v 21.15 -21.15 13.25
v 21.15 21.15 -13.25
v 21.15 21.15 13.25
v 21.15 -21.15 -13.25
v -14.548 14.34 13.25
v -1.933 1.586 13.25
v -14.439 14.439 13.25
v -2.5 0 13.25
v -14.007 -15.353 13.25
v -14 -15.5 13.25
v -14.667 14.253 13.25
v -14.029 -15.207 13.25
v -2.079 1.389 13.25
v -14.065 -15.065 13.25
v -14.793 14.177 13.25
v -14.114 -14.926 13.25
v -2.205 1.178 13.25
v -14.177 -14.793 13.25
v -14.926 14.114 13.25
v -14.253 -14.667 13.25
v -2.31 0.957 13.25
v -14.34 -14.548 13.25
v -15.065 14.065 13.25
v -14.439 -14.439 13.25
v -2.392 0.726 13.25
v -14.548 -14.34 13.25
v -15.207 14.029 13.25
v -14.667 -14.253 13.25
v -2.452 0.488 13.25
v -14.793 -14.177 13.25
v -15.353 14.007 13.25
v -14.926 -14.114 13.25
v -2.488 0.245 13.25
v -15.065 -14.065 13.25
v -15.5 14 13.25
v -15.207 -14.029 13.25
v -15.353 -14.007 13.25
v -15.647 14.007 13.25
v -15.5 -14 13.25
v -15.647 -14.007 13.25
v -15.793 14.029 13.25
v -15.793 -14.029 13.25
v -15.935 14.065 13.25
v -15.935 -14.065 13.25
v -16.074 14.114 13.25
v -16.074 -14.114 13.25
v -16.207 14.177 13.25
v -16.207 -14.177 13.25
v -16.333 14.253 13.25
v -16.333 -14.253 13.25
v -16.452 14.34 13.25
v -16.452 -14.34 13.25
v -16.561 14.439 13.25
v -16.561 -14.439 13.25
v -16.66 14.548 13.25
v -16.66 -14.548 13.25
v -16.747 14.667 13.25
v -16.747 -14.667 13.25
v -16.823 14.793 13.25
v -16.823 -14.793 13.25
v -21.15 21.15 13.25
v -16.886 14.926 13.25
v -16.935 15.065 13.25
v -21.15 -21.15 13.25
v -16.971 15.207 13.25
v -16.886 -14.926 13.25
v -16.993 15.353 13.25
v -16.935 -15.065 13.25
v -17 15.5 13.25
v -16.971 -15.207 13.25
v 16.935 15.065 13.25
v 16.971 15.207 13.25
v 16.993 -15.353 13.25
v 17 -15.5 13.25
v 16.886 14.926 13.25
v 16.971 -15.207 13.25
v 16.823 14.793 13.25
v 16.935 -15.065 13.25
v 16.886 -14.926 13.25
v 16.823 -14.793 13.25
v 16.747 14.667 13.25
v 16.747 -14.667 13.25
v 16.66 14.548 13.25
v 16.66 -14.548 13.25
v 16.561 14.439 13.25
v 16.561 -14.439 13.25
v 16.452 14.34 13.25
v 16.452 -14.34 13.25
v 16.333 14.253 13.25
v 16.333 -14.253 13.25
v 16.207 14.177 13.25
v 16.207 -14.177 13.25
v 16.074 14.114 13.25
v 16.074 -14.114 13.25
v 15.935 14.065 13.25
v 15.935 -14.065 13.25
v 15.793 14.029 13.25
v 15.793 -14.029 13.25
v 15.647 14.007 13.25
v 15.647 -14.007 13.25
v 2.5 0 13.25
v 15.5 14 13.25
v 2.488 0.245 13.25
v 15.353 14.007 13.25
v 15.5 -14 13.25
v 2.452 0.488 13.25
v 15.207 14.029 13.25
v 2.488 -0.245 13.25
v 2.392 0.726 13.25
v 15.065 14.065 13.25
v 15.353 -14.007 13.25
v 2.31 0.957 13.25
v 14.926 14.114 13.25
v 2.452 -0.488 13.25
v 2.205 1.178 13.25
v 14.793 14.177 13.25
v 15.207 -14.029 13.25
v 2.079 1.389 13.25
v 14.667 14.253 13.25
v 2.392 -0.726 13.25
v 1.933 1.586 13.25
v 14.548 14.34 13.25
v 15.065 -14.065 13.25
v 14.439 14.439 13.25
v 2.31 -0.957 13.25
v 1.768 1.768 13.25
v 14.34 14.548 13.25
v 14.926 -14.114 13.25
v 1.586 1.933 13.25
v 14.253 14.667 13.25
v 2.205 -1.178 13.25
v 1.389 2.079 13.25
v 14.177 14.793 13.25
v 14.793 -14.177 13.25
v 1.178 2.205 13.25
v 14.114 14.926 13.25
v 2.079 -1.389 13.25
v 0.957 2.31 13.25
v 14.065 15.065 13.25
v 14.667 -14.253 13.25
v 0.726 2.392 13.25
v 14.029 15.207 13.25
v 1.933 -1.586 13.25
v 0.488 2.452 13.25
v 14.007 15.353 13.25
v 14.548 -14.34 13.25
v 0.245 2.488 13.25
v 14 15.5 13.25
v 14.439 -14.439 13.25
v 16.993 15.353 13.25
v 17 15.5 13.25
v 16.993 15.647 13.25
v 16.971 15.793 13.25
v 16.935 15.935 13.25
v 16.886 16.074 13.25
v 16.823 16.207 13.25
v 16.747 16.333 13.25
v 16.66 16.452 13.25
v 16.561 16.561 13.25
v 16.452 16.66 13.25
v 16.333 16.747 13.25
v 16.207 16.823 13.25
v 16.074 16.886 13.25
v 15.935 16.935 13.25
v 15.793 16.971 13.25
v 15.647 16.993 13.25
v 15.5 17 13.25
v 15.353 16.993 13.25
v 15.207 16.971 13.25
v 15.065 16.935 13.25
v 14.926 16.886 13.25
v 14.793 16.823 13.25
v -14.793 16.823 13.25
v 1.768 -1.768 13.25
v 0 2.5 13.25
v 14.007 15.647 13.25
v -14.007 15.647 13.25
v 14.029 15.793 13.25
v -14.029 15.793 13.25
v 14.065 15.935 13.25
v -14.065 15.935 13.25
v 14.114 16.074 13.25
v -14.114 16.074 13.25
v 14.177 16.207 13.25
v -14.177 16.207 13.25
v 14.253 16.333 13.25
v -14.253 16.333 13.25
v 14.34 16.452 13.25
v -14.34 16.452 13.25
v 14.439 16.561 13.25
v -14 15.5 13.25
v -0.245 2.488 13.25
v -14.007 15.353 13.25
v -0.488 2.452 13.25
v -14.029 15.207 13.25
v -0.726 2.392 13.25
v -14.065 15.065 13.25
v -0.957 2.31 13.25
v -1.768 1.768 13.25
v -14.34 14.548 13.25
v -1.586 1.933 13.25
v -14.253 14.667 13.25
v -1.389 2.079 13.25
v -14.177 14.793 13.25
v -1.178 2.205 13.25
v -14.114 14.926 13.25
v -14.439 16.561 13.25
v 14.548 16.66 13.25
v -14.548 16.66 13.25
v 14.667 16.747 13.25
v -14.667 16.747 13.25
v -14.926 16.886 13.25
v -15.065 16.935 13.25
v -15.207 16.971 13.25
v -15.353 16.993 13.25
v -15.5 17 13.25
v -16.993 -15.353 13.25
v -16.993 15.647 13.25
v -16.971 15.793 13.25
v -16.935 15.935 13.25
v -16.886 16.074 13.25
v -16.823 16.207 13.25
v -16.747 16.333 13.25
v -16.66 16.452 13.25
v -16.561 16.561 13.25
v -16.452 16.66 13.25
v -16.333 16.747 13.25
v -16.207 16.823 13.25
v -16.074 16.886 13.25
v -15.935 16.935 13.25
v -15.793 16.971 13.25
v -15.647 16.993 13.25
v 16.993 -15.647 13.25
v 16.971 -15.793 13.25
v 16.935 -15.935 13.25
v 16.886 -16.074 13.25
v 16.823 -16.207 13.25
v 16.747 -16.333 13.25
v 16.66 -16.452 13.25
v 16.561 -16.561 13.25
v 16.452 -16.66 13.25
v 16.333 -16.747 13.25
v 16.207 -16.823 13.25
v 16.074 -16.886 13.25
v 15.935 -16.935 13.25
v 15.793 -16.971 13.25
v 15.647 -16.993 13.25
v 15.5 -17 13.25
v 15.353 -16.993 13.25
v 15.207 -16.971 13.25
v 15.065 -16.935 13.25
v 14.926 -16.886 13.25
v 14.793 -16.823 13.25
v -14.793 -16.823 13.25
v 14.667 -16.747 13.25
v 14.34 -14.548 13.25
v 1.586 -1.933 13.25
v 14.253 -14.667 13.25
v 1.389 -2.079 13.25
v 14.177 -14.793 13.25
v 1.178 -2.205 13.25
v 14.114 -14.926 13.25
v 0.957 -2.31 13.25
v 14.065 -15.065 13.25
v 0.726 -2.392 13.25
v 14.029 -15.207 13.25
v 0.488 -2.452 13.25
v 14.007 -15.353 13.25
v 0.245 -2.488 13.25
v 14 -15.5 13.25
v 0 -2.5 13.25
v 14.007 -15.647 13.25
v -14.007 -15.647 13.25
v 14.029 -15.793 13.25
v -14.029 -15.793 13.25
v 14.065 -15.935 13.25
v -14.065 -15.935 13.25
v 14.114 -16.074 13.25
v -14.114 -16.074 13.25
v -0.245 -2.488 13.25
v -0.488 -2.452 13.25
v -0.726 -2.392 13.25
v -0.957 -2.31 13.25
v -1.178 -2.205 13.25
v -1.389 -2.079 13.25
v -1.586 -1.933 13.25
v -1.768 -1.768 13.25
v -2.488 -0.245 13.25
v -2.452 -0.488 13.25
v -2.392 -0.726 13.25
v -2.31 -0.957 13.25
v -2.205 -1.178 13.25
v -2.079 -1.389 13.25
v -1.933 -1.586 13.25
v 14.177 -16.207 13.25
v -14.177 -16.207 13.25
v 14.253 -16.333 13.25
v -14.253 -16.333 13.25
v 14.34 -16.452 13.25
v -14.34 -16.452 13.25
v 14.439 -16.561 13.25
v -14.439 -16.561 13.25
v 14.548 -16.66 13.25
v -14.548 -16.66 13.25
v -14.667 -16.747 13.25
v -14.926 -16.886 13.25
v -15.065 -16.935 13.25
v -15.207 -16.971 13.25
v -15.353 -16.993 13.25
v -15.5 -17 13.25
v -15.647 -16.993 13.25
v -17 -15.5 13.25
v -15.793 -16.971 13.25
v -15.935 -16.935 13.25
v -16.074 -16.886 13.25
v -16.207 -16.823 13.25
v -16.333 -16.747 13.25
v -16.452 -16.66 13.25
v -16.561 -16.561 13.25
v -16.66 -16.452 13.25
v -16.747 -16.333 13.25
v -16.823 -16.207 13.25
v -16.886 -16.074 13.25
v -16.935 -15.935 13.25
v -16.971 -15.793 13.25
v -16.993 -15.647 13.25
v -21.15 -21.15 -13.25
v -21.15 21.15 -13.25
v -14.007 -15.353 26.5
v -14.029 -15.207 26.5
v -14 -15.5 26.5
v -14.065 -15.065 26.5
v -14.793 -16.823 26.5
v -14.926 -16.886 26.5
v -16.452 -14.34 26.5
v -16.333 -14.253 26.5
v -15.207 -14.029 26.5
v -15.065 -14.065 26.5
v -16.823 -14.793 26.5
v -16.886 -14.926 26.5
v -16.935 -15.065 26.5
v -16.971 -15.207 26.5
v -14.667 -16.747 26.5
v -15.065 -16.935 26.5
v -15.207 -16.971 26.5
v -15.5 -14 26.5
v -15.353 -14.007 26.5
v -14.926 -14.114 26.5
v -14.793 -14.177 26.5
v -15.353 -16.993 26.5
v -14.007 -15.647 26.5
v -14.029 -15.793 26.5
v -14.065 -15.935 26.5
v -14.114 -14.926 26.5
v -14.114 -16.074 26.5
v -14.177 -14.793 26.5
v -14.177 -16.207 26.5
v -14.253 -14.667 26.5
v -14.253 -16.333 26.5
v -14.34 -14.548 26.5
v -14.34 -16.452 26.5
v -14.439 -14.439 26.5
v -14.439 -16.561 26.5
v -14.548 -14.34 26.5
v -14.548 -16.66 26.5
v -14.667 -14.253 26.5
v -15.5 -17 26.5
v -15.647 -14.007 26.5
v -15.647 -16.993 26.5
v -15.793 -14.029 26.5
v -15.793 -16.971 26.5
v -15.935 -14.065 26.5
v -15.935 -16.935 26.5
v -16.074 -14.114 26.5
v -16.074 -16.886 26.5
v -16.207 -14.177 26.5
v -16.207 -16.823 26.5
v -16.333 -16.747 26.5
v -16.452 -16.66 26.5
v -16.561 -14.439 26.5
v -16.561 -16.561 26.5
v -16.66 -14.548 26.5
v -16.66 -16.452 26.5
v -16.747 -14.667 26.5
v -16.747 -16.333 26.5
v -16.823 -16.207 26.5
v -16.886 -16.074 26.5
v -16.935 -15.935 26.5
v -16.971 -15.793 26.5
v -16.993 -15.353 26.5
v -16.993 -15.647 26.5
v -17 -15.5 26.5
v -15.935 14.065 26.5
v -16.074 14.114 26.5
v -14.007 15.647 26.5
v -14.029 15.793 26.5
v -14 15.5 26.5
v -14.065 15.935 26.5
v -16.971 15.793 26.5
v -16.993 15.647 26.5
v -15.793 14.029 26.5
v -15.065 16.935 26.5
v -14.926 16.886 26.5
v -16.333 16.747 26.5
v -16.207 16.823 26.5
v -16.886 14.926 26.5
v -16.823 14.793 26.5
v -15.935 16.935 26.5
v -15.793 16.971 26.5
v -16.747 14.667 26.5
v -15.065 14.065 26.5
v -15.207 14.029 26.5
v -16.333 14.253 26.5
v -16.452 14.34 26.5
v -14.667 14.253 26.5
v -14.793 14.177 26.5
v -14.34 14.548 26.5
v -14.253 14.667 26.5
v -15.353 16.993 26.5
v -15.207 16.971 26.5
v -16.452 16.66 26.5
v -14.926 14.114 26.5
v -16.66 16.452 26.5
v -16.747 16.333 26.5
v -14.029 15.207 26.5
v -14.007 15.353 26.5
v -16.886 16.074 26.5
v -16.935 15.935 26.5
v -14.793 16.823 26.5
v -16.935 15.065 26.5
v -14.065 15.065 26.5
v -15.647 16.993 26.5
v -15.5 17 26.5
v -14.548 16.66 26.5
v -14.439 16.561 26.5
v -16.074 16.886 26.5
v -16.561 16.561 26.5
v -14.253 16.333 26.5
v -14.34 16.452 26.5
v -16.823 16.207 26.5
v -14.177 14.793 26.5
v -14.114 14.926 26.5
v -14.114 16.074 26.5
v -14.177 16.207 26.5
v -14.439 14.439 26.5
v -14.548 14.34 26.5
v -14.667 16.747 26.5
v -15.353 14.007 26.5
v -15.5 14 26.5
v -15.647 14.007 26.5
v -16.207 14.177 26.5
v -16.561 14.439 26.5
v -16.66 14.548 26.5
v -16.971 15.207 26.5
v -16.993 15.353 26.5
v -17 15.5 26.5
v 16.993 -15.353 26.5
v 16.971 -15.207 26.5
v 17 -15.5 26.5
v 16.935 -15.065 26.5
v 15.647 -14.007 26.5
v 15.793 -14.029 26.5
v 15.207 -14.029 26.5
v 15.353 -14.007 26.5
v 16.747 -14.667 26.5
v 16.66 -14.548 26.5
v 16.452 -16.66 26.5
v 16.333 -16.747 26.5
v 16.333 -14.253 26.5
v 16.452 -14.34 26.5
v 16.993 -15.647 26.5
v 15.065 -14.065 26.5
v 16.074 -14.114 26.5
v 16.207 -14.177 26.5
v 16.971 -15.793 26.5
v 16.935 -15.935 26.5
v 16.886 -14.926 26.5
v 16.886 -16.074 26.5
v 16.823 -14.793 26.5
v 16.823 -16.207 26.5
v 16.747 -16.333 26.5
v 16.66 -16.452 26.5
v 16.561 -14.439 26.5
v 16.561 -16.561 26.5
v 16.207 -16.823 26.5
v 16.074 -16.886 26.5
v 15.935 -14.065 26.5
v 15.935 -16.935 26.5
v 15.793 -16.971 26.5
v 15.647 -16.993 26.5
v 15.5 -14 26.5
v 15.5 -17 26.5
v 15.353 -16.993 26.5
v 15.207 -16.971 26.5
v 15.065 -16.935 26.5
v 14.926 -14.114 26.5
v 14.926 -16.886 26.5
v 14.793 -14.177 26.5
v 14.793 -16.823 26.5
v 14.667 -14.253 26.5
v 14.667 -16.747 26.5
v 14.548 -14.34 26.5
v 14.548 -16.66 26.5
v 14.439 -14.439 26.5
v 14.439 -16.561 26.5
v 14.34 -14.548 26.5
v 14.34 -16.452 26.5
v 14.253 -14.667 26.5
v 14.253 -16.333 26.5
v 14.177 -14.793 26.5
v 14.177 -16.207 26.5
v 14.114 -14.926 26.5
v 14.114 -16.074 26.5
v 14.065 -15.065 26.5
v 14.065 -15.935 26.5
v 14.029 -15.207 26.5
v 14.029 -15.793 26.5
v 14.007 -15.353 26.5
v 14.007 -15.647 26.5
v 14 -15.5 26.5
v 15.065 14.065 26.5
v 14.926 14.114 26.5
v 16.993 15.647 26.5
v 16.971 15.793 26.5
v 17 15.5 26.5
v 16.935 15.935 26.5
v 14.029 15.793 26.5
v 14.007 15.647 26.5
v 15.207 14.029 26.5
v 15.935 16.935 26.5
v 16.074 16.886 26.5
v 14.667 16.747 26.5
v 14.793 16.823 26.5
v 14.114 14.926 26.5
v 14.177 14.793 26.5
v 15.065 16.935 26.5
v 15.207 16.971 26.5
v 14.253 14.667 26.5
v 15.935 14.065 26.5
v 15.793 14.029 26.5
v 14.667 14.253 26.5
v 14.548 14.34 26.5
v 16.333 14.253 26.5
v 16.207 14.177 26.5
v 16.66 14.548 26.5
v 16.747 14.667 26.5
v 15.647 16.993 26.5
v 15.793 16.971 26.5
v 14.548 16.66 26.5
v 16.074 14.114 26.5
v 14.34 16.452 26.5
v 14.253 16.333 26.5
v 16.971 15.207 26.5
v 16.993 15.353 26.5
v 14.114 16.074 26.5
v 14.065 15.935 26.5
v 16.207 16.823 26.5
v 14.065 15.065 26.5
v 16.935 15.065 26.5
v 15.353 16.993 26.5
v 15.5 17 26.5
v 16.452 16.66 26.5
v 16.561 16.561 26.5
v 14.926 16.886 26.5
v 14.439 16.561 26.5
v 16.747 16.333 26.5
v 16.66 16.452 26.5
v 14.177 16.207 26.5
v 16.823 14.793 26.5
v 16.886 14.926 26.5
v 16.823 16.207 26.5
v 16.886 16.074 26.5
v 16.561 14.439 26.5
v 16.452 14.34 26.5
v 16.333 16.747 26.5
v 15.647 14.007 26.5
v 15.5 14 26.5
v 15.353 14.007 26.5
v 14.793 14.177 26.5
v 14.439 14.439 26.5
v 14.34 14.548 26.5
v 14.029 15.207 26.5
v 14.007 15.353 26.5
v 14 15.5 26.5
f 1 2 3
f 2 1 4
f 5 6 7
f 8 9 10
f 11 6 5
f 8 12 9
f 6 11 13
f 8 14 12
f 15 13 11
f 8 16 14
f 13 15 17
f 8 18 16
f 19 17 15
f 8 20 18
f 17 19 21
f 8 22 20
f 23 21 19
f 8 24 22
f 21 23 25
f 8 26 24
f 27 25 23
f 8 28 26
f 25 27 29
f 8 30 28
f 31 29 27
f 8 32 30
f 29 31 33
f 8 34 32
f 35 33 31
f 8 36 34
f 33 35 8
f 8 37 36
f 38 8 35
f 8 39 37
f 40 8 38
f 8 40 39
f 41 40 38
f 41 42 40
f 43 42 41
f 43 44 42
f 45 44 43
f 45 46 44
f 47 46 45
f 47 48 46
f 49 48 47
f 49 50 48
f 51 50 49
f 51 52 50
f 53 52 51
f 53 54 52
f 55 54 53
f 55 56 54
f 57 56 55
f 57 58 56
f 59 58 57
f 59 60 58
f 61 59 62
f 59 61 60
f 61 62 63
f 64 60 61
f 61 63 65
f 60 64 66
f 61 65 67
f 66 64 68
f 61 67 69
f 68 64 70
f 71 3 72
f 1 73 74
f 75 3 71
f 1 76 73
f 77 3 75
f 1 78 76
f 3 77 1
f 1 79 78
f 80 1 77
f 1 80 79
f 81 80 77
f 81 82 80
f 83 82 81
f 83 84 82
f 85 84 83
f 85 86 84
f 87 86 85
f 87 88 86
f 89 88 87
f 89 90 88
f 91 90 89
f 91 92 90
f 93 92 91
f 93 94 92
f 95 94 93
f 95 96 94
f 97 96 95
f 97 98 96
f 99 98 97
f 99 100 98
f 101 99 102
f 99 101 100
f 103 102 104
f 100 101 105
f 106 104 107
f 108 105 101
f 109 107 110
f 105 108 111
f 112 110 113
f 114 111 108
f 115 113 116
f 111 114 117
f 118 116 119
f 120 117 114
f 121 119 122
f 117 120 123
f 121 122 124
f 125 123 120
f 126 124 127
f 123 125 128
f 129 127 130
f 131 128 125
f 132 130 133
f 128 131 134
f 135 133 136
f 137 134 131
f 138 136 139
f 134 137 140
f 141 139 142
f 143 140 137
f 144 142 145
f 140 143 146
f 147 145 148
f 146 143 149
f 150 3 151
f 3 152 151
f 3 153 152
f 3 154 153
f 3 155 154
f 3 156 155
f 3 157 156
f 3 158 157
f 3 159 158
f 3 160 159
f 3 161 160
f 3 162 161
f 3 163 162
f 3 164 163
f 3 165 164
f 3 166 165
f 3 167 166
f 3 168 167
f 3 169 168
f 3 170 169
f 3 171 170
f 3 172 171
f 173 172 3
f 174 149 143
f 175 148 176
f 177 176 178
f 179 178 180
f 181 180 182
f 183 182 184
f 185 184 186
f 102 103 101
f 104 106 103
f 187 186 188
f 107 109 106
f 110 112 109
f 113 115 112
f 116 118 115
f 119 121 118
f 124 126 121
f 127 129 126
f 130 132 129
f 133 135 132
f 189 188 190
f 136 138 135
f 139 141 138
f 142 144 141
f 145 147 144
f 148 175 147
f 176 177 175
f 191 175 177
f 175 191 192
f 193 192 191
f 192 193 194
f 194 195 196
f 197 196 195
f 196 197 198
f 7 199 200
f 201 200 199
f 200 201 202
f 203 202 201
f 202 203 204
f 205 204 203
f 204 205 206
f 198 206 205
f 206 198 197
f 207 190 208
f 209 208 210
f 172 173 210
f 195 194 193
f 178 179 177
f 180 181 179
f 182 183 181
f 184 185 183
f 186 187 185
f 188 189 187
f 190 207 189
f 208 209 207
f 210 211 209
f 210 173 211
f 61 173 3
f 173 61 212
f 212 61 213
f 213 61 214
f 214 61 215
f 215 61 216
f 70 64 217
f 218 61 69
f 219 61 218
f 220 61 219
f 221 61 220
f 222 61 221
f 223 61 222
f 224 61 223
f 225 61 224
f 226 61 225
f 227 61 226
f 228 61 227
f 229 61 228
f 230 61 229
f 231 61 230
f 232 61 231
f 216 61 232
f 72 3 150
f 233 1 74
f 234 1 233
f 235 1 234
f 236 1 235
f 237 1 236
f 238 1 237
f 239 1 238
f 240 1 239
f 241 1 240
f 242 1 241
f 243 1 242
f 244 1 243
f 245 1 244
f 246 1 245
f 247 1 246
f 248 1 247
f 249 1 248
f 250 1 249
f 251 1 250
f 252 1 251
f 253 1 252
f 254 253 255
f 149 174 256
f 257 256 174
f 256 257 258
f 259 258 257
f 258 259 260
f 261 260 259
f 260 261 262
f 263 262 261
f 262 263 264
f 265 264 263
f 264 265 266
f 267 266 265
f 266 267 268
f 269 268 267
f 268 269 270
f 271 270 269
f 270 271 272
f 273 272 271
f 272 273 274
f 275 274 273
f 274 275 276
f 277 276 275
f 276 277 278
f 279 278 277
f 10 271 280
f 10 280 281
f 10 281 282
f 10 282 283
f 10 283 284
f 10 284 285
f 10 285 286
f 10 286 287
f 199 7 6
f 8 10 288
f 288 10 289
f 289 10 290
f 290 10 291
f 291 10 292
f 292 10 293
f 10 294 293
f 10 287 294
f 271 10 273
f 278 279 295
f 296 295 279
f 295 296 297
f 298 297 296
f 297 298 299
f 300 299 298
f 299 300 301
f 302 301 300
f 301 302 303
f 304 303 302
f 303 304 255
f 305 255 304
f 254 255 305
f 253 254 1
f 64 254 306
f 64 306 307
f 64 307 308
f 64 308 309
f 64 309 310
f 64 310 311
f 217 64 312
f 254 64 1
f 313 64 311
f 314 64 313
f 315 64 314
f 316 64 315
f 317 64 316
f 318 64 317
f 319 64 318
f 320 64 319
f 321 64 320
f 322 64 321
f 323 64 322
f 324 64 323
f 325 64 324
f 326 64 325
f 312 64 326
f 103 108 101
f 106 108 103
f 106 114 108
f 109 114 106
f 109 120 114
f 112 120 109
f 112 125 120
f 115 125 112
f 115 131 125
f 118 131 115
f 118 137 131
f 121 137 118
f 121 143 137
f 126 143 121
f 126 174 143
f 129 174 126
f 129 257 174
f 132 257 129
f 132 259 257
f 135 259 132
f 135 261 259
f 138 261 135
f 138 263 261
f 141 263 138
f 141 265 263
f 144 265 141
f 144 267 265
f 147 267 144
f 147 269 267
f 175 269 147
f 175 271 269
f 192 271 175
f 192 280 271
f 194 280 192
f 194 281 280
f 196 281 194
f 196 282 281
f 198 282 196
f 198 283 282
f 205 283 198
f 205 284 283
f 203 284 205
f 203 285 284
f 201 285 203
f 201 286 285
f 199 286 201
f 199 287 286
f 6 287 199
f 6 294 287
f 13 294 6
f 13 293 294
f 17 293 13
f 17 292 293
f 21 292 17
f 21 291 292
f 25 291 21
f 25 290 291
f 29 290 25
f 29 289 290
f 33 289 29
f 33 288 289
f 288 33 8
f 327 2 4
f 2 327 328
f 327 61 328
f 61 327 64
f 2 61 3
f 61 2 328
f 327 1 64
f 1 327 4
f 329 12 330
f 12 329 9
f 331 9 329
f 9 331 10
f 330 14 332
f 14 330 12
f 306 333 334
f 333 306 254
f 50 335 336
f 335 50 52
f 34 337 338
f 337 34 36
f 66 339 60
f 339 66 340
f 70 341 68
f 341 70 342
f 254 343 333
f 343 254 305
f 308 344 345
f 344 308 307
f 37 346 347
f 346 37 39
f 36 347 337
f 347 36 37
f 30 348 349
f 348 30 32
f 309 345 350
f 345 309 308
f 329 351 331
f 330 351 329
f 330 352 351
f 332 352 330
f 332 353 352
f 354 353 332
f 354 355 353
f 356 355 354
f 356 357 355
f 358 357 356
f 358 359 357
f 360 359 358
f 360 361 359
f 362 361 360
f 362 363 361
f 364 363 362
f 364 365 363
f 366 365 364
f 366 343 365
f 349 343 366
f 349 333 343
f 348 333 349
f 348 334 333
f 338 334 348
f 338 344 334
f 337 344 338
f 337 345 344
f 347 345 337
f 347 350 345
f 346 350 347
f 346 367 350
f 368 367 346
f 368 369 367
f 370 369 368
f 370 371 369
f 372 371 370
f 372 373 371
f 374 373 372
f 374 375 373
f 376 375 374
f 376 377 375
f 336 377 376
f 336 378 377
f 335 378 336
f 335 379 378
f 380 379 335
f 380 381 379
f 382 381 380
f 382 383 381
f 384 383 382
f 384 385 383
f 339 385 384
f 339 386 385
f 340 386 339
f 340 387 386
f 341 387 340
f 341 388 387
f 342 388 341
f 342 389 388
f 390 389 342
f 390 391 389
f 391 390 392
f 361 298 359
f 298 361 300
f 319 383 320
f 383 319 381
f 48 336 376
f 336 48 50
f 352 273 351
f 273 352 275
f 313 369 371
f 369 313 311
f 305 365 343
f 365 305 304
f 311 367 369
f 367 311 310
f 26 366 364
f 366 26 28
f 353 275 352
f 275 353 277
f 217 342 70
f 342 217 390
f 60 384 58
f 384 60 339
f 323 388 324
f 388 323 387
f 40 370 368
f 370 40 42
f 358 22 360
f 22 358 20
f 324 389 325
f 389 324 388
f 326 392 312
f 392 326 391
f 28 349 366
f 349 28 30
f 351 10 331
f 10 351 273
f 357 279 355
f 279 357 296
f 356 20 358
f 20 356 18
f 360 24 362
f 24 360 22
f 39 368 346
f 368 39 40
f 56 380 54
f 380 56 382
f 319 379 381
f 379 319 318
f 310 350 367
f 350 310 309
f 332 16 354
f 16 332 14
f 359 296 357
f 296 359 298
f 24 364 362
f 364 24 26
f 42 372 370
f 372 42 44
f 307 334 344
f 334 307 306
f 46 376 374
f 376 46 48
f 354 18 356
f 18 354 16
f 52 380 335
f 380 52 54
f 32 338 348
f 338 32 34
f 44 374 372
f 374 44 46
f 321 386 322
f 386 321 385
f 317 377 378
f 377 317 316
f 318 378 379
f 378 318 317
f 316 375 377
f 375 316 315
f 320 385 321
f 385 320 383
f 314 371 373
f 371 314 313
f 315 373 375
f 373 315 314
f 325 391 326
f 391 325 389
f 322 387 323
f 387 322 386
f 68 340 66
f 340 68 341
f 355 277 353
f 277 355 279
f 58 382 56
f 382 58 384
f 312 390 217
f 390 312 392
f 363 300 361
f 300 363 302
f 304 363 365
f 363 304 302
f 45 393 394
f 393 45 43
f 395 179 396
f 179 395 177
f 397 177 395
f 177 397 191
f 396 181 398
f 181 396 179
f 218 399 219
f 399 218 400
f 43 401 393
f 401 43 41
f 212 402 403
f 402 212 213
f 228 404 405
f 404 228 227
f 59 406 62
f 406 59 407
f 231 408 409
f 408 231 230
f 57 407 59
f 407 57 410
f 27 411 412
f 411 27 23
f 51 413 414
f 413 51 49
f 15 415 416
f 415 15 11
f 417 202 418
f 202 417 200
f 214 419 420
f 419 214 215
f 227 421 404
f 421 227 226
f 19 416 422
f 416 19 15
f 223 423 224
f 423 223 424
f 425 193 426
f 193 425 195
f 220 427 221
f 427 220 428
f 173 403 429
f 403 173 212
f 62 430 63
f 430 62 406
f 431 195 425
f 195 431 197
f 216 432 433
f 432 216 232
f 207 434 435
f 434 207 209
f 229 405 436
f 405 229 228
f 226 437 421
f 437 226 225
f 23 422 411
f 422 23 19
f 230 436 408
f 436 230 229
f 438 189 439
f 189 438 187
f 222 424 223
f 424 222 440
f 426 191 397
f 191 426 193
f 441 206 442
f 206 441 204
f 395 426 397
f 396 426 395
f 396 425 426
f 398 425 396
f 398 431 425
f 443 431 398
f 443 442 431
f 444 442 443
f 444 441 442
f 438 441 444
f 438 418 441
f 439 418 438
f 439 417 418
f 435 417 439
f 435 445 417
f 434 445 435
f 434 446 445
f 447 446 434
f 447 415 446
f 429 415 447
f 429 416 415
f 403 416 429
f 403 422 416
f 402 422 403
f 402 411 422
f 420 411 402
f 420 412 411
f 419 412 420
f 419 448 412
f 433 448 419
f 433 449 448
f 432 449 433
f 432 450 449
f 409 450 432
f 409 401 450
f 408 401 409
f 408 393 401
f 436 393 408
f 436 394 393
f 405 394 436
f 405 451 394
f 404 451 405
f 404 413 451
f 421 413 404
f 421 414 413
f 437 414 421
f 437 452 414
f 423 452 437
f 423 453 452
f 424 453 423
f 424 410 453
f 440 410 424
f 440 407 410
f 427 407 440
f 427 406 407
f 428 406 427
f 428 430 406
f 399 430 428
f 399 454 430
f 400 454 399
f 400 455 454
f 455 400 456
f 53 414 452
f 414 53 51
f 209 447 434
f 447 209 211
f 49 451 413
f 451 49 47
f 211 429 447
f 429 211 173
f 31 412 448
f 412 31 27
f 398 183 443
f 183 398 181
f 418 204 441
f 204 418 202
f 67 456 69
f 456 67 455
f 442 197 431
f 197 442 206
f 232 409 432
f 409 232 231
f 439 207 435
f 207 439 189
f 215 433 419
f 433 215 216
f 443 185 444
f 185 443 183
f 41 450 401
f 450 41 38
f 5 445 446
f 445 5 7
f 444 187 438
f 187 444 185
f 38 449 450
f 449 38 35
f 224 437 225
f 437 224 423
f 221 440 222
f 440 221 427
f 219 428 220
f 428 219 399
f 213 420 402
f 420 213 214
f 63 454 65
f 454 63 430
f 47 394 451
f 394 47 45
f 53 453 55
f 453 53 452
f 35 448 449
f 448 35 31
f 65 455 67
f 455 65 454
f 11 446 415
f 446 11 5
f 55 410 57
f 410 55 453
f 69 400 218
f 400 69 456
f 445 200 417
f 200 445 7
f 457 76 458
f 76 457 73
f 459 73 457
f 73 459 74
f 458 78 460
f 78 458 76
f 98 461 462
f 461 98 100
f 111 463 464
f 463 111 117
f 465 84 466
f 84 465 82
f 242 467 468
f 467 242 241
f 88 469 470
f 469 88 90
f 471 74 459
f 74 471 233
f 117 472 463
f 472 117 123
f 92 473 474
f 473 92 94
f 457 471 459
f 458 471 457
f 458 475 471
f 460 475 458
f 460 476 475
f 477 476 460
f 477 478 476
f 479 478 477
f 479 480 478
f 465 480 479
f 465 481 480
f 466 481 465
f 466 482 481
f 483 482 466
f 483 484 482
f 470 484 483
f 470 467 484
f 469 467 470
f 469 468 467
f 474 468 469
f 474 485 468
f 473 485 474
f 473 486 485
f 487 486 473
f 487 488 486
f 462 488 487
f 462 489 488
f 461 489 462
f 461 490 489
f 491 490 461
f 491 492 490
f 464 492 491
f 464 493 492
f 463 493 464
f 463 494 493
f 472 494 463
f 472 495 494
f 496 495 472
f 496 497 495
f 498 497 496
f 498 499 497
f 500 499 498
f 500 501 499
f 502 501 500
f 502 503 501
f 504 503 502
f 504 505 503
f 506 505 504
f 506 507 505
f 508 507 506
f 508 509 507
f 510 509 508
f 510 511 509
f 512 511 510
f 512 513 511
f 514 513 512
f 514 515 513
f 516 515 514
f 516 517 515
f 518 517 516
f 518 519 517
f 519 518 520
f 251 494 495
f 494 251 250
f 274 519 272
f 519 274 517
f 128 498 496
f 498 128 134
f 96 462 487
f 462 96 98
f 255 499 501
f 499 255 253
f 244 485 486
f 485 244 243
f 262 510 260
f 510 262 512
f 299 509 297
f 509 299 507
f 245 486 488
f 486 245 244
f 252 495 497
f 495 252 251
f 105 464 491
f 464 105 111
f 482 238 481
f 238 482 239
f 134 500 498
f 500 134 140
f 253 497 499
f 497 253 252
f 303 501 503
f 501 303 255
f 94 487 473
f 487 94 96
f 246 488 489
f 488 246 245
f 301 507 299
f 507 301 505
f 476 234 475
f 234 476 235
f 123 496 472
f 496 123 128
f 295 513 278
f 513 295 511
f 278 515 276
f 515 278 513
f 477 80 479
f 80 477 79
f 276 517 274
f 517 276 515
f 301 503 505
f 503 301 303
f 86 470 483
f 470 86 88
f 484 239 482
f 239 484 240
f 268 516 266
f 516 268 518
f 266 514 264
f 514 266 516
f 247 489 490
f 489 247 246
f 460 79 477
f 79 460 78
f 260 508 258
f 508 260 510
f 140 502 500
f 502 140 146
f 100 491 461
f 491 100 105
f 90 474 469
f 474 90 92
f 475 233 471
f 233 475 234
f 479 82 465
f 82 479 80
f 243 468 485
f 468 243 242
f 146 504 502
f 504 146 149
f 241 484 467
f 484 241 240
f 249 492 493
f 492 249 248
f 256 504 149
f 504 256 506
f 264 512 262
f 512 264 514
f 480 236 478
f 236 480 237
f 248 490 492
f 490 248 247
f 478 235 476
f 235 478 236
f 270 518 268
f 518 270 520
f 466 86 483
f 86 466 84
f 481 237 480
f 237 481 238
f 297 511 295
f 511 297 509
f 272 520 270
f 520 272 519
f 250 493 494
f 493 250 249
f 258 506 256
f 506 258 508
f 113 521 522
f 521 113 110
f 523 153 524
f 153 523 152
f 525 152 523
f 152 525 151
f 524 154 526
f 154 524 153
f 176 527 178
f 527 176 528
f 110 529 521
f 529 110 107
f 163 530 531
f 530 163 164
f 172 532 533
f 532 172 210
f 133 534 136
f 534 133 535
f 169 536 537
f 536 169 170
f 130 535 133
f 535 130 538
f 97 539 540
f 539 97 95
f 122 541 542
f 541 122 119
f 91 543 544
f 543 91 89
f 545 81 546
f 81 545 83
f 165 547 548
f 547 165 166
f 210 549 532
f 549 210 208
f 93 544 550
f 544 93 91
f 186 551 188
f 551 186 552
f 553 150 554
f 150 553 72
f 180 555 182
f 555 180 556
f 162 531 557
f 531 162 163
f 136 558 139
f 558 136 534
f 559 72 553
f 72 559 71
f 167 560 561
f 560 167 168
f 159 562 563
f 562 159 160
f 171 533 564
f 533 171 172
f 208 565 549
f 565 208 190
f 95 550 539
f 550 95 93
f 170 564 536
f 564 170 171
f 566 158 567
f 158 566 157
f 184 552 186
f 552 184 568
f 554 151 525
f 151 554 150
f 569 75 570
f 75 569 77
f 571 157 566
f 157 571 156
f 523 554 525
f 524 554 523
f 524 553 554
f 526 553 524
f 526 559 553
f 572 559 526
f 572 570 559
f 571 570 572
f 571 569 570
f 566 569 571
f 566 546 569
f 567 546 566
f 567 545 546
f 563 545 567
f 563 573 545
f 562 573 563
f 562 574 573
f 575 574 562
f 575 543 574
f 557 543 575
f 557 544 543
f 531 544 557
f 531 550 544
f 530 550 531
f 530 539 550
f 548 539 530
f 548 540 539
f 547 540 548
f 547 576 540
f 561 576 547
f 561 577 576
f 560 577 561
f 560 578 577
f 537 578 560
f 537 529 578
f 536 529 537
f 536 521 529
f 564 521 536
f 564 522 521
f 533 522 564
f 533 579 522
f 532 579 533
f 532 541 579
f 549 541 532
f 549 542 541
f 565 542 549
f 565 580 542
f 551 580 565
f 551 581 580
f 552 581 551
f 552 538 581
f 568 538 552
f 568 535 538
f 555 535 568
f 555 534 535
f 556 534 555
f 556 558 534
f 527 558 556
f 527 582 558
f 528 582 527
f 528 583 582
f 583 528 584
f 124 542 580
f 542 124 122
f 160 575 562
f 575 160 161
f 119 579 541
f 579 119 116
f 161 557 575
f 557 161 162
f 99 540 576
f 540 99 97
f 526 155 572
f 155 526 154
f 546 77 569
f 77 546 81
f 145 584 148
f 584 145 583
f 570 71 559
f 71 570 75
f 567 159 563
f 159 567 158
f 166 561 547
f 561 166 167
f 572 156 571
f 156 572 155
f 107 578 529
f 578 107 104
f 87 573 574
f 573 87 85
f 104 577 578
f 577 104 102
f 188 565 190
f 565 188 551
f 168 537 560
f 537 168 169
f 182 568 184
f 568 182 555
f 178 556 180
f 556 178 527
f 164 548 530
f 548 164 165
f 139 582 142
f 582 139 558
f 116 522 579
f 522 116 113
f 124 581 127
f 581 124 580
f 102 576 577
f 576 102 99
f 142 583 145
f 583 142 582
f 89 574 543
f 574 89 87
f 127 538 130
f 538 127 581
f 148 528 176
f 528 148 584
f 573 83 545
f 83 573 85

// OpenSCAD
module stepper_motor() {
    // Motor body
    difference() {
        cube([42.3, 42.3, 26.5], center = true);
        // Shaft hole
        translate([0, 0, 13.25])
            cylinder(h = 26.5, d = 5.0, $fn = 64);
    }
    
    // Mounting holes
    translate([-15.5, -15.5, 0])
        for (x = [0, 31.0])
            for (y = [0, 31.0])
                translate([x, y, 0])
                    cylinder(h = 26.5, d = 3.0, $fn = 64);
}

stepper_motor();
